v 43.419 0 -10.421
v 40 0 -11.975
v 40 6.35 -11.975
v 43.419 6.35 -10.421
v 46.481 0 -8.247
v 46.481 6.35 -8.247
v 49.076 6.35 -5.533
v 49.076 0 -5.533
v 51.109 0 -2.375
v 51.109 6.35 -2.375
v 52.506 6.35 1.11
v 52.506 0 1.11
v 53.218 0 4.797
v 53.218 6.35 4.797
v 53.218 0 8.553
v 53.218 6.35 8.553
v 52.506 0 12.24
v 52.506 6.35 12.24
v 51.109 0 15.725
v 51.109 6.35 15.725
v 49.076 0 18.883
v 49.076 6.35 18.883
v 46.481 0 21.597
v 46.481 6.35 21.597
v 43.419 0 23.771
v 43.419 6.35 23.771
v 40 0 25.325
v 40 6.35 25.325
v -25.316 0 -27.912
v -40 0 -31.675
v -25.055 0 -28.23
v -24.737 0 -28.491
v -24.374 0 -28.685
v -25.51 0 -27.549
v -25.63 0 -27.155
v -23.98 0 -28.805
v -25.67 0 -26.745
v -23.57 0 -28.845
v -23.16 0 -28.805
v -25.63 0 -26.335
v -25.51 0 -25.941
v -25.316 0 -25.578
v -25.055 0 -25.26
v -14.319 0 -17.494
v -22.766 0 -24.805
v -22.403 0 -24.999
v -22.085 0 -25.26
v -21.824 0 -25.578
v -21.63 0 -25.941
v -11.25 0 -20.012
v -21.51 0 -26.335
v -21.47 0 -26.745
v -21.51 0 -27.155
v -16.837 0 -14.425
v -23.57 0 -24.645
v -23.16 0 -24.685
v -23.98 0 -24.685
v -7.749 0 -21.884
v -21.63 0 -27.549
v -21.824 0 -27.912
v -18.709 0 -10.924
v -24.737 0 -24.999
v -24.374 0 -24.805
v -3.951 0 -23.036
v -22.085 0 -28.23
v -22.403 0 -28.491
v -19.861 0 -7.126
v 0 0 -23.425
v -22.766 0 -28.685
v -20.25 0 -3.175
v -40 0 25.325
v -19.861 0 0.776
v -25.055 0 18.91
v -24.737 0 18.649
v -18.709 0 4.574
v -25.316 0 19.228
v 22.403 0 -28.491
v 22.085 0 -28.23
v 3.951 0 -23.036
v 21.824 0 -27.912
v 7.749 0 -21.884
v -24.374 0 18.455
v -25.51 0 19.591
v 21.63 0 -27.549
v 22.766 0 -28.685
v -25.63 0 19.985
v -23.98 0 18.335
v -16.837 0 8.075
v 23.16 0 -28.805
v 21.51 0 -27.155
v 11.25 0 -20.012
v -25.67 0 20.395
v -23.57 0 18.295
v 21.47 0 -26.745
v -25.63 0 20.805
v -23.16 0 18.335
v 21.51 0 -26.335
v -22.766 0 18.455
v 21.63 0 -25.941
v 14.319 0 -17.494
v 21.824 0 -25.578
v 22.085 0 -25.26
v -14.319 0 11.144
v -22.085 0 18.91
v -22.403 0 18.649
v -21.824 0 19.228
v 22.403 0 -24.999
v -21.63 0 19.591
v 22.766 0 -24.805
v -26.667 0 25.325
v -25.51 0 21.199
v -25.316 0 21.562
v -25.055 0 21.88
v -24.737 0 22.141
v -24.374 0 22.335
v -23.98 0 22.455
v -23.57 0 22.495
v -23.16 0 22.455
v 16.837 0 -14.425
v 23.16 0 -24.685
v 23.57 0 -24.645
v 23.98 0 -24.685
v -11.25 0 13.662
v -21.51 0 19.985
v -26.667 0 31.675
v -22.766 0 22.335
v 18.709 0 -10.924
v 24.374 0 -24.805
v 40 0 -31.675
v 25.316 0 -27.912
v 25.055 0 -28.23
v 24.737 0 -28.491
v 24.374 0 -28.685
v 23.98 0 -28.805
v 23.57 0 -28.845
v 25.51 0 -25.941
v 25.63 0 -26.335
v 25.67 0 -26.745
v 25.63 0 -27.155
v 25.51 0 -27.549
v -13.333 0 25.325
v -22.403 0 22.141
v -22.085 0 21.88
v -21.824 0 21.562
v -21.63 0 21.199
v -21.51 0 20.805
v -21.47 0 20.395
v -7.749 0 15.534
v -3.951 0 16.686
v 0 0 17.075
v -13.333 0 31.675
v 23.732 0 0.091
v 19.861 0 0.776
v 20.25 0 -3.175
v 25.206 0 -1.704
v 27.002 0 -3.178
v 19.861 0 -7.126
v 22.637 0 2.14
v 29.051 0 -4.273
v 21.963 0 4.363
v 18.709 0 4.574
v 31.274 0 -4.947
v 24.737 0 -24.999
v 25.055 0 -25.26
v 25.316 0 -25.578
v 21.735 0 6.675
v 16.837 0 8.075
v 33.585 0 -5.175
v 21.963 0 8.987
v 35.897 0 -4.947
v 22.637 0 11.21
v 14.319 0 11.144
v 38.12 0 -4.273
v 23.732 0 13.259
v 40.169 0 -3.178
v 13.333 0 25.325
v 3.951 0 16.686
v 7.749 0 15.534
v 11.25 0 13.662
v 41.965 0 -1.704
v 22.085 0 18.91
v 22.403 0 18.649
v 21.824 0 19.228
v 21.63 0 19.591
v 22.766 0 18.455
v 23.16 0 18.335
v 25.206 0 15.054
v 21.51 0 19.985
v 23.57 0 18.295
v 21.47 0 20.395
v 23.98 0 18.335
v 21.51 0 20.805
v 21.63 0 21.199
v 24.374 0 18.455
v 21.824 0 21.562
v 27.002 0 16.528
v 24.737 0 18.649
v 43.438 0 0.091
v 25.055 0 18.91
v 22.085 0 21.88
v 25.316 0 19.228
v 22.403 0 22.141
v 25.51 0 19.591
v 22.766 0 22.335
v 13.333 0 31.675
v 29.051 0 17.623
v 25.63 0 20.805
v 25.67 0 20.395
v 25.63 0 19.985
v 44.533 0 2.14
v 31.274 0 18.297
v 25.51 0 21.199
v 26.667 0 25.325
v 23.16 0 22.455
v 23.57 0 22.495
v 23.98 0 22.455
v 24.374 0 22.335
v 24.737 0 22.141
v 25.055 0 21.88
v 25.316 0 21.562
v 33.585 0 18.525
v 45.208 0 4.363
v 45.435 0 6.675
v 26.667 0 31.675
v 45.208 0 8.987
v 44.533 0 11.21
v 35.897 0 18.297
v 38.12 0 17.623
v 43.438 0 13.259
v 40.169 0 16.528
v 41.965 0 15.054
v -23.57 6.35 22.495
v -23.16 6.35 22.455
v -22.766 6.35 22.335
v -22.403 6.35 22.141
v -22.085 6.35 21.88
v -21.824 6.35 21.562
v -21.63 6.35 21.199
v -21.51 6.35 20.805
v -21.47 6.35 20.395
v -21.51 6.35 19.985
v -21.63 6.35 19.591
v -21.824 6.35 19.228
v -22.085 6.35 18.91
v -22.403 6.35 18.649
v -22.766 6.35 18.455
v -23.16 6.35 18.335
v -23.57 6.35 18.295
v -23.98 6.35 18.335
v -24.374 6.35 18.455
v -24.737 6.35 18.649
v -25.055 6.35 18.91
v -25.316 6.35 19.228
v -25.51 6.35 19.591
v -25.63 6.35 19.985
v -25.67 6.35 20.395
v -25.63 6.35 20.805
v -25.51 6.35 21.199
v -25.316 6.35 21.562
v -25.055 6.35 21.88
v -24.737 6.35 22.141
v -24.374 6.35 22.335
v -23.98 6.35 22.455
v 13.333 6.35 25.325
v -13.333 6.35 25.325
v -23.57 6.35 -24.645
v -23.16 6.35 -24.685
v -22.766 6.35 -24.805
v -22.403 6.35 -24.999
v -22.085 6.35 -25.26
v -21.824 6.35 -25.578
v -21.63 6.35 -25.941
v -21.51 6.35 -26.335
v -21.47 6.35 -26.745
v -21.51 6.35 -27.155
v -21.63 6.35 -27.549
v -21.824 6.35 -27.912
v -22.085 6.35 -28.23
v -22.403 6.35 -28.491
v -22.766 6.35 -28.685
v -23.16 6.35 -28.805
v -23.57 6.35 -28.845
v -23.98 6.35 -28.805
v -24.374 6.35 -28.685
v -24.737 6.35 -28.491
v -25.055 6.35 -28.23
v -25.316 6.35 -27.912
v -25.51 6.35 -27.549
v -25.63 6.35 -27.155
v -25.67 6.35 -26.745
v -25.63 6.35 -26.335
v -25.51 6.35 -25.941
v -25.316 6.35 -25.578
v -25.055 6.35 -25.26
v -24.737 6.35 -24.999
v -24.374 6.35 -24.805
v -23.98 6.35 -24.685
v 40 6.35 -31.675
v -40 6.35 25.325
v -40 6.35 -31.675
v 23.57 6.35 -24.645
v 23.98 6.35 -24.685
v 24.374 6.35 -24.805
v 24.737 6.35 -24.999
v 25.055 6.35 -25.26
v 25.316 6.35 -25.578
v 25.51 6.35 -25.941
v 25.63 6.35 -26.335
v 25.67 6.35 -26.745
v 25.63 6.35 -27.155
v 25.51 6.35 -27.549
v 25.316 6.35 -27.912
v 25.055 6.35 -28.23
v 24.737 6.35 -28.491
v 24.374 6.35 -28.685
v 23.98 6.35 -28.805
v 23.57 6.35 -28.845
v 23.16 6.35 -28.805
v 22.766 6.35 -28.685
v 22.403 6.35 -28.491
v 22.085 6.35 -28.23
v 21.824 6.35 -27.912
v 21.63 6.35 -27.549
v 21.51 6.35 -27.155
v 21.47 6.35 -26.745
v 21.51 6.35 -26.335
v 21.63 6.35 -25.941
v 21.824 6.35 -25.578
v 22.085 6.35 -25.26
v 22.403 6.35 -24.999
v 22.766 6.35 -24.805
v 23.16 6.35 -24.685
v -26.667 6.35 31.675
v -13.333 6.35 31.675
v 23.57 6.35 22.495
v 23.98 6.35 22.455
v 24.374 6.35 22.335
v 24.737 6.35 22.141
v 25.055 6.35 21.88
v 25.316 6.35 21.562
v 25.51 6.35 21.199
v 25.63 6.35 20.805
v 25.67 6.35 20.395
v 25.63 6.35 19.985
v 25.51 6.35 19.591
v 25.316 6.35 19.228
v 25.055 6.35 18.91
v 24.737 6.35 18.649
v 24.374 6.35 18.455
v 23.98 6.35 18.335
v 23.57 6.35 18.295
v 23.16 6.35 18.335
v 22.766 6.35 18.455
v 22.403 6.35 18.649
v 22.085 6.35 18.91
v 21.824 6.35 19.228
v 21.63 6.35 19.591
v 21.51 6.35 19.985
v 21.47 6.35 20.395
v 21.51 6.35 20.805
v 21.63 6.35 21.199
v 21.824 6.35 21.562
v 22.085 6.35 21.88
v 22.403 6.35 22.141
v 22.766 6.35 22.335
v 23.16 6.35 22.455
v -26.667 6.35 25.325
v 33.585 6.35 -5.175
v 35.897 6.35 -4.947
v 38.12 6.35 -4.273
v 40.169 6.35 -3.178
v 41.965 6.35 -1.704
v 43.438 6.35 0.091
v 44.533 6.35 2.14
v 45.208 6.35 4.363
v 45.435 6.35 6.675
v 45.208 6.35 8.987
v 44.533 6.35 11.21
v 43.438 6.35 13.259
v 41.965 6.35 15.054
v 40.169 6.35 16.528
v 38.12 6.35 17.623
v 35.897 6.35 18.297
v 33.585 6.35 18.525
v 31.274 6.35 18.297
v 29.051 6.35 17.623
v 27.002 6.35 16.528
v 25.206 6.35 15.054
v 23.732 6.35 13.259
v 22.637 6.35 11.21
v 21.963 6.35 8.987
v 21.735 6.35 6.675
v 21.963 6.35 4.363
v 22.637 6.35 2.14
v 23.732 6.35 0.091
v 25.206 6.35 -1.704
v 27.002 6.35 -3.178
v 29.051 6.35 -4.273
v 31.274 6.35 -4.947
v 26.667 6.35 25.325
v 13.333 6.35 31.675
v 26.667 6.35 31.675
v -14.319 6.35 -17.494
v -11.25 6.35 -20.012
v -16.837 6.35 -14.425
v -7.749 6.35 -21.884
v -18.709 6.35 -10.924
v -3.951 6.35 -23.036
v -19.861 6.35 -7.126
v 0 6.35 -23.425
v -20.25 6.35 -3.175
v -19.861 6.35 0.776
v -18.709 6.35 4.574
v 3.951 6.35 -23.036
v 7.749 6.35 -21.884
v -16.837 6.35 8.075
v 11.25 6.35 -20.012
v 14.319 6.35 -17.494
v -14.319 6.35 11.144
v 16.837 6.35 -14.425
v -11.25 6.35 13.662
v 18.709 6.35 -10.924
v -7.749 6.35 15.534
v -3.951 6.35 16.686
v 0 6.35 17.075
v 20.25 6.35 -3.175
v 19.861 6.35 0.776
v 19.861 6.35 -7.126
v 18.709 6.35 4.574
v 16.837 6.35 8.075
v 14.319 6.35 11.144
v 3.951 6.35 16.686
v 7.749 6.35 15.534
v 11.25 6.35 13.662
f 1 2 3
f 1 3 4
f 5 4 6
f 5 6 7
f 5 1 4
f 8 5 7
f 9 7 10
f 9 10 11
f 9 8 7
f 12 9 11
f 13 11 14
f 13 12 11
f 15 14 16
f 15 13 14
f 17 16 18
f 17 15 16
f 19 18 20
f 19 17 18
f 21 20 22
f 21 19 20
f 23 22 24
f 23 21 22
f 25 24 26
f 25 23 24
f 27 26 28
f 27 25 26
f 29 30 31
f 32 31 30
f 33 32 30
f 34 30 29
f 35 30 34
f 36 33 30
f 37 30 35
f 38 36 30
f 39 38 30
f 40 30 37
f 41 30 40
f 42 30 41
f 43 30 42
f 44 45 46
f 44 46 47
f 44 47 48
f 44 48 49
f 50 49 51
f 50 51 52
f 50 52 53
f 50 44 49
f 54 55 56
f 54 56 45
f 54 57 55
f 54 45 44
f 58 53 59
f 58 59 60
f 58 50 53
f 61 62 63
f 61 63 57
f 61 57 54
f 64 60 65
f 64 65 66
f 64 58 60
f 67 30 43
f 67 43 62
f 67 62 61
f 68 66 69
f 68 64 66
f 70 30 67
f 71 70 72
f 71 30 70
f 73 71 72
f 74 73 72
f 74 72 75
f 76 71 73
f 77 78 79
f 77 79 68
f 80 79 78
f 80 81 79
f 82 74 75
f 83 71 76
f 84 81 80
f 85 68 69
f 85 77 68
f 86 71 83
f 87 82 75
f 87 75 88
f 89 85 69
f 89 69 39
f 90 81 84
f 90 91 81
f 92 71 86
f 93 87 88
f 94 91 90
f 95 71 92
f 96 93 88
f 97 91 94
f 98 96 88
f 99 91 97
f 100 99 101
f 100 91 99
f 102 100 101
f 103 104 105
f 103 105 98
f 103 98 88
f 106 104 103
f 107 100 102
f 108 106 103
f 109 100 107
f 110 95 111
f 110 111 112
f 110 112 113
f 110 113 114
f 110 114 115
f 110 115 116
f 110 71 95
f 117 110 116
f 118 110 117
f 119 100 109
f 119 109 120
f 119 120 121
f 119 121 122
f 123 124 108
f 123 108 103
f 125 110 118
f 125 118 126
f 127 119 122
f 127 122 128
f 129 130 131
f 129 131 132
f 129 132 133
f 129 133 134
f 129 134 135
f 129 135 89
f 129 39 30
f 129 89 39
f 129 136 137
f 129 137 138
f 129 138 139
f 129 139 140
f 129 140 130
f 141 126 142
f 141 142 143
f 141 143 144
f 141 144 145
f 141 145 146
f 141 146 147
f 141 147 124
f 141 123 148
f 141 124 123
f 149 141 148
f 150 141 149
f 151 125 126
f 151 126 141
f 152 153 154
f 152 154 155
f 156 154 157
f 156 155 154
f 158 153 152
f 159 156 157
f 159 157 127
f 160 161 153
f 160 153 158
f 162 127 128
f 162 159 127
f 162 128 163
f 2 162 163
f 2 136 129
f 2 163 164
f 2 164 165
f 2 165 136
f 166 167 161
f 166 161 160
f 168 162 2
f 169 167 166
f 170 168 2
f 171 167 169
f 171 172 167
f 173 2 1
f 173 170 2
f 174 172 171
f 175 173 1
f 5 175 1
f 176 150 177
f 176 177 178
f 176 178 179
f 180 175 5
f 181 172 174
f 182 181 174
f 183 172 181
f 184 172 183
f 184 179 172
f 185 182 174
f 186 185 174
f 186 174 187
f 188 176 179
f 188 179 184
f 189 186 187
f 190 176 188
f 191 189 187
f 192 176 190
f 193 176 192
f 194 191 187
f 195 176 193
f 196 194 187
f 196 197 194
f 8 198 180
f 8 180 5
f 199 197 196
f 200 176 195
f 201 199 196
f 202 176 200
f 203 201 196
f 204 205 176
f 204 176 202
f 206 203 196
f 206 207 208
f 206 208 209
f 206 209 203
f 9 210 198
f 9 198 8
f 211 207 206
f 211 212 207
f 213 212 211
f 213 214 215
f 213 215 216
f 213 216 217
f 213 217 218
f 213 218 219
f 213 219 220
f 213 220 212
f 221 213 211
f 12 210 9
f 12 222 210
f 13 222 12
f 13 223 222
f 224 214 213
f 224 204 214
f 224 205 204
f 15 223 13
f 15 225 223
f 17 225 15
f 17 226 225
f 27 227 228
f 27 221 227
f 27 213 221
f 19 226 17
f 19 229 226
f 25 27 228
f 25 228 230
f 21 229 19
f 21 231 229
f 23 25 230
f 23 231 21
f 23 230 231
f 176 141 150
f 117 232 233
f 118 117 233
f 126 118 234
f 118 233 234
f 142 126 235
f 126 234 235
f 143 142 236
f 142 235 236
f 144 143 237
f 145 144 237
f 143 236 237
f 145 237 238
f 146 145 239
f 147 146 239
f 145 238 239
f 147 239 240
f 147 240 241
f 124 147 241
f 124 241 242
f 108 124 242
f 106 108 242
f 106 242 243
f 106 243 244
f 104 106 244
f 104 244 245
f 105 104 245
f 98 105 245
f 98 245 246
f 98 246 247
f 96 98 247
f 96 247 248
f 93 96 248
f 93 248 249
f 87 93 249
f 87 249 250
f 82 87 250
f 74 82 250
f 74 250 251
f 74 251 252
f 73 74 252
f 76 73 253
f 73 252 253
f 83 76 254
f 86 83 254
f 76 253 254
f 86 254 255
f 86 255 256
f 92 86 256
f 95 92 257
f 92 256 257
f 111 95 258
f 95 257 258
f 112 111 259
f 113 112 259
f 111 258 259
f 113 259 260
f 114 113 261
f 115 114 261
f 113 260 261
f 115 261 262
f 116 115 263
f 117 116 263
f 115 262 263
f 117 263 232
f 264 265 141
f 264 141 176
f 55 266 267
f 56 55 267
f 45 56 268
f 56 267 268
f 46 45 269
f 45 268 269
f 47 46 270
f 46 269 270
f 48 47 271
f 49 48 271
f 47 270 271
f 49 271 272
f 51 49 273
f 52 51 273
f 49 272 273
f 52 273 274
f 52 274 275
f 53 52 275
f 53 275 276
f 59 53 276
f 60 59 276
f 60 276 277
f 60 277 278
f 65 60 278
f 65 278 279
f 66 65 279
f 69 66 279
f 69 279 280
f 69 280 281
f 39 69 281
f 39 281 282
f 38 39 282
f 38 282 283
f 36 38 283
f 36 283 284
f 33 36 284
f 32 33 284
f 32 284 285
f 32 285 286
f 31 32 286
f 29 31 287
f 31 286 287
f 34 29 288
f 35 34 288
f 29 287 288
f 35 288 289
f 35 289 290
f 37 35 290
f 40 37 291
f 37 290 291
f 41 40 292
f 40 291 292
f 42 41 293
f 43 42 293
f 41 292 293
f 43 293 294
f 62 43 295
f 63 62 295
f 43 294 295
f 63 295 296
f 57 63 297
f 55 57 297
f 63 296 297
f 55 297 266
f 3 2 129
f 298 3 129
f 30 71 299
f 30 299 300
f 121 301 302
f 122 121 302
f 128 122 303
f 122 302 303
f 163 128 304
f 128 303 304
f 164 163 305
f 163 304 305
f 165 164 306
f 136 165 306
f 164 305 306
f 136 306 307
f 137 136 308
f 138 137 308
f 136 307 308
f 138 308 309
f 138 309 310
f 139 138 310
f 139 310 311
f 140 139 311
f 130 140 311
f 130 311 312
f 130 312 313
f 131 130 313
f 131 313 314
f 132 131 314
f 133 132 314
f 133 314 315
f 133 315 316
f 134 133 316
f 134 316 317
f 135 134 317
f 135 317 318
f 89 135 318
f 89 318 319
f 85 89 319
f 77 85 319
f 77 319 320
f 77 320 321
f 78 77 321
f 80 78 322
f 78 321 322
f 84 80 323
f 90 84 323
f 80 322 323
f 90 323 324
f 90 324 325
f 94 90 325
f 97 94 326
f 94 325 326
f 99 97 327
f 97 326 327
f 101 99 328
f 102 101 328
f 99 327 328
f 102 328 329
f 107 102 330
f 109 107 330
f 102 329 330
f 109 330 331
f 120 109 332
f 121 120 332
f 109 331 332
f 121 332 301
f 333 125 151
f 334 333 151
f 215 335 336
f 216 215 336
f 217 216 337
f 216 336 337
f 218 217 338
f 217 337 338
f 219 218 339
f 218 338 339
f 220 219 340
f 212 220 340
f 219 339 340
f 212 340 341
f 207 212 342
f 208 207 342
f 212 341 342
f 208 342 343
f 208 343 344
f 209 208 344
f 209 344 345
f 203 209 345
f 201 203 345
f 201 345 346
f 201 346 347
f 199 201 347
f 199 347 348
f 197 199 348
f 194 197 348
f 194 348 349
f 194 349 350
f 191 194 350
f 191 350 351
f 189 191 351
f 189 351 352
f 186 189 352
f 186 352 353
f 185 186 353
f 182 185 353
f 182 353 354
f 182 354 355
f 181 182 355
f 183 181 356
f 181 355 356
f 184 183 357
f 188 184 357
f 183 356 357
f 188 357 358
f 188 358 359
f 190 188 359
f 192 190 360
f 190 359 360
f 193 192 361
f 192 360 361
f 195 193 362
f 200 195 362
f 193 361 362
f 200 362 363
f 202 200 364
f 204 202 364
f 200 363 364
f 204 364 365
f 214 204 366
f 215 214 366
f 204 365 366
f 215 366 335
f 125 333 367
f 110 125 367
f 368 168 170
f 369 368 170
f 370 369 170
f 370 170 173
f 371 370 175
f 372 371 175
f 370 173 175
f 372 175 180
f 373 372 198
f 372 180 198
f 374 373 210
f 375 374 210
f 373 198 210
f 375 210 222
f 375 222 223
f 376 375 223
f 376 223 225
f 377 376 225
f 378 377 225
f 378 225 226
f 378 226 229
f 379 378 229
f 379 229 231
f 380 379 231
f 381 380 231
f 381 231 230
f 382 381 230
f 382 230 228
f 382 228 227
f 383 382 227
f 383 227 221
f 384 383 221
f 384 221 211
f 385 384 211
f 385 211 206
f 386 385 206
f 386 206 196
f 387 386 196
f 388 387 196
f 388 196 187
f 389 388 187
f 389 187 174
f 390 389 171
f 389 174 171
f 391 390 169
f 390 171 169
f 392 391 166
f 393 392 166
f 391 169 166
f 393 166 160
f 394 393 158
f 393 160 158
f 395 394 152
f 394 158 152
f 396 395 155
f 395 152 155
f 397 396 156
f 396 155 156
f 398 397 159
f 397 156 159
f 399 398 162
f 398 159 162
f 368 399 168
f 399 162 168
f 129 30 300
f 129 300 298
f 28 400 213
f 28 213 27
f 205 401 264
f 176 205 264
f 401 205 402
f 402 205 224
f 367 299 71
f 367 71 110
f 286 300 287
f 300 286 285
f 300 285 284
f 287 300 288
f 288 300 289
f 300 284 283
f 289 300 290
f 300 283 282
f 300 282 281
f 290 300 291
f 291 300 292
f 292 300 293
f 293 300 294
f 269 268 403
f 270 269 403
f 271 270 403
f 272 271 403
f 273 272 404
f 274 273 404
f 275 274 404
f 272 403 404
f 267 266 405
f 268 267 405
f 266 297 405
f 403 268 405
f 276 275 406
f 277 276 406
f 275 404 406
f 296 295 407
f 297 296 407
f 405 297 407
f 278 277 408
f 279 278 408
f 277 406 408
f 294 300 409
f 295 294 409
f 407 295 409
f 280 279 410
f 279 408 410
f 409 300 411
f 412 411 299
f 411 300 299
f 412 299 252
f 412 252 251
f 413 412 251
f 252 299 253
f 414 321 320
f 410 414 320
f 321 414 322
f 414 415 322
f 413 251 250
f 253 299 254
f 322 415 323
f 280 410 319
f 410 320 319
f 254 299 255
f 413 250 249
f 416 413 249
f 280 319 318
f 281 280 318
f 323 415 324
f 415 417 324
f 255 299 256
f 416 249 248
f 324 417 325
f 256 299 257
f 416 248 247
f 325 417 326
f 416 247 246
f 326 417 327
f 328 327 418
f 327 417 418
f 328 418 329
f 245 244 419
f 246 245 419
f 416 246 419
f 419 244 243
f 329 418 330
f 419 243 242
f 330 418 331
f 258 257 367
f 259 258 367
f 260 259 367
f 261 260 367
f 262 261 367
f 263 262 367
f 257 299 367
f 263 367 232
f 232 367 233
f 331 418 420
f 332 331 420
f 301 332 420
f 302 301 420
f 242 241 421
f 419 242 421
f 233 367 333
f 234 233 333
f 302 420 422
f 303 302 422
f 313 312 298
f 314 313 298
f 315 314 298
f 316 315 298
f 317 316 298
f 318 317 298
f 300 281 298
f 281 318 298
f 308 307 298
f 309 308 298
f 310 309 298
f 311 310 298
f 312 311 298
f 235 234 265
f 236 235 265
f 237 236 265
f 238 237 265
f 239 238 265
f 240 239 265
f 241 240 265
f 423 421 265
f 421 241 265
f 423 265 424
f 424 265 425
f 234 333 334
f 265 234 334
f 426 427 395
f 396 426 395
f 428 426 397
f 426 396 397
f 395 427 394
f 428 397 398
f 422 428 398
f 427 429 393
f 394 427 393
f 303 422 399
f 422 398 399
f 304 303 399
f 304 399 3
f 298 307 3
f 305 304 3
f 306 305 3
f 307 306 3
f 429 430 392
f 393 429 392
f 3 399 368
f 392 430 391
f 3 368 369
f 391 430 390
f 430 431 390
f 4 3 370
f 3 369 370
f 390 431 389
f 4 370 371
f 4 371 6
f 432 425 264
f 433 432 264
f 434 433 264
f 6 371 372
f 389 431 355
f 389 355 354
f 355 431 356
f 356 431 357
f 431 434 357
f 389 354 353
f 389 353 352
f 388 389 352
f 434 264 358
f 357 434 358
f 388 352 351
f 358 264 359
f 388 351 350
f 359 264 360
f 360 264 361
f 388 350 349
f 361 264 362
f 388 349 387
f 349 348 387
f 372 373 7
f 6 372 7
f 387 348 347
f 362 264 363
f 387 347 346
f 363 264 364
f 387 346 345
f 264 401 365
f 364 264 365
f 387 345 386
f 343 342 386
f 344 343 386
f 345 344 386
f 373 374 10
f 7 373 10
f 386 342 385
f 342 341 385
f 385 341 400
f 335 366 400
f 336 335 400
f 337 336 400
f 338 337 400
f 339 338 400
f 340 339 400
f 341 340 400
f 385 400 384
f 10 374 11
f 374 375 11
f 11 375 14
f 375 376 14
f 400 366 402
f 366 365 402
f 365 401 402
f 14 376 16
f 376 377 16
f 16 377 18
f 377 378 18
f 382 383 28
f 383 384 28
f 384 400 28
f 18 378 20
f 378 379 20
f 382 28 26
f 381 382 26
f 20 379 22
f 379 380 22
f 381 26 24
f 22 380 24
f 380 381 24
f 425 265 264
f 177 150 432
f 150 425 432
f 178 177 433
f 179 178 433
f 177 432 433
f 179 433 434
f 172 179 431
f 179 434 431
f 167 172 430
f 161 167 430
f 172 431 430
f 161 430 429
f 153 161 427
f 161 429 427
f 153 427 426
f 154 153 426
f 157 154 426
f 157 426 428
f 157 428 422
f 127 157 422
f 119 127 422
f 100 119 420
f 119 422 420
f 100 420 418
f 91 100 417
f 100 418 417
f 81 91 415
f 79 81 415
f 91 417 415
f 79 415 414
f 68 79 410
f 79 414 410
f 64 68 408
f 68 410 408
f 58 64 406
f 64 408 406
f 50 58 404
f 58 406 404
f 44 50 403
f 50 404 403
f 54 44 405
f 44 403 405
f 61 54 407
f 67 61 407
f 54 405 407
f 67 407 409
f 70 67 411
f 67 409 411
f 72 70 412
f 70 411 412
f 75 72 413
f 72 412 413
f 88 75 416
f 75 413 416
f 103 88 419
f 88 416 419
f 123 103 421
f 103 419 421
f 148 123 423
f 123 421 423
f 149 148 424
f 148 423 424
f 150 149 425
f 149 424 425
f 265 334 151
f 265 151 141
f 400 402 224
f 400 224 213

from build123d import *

# Parameters (mm, degrees)
SKETCH1_W           = 80
SKETCH1_H           = 63.35
BOSS_EXTRUDE1_DEPTH = 6.35
SKETCH2_W           = 13.333333333
SKETCH2_H           = 6.35
SKETCH2_W_2         = 26.666666666
CUT_EXTRUDE2_DEPTH  = 52.416224336
SKETCH3_R           = 20.25
CUT_EXTRUDE3_DEPTH  = 2.55
SKETCH4_R           = 20.25
CUT_EXTRUDE4_DEPTH  = 52.416224336
SKETCH5_R           = 2.1
CUT_EXTRUDE5_DEPTH  = 52.416224336
BOSS_EXTRUDE2_DEPTH = 6.35
SKETCH13_R          = 11.85
CUT_EXTRUDE8_DEPTH  = 10


with BuildPart() as part:
    # Sketch1 → Boss-Extrude1 (new body)
    with BuildSketch(Plane(origin=(0, 0, 0), x_dir=(1, 0, 0), z_dir=(0, 1, 0))):
        Rectangle(SKETCH1_W, SKETCH1_H)
    extrude(amount=BOSS_EXTRUDE1_DEPTH)

    # Sketch2 → Cut-Extrude2 (cut, through all)
    with BuildSketch(Plane(origin=(0, 6.35, 0), x_dir=(1, 0, 0), z_dir=(0, 1, 0))):
        with Locations((-33.333333334, -28.5)):
            Rectangle(SKETCH2_W, SKETCH2_H)
        with Locations((33.333333334, -28.5)):
            Rectangle(SKETCH2_W, SKETCH2_H)
        with Locations((0, -28.5)):
            Rectangle(SKETCH2_W_2, SKETCH2_H)
    extrude(amount=-CUT_EXTRUDE2_DEPTH, mode=Mode.SUBTRACT)

    # Sketch3 → Cut-Extrude3 (cut)
    with BuildSketch(Plane(origin=(0, 6.35, 0), x_dir=(1, 0, 0), z_dir=(0, 1, 0))):
        with Locations(Location((0, 3.175, 0), (0, 0, 270))):
            Circle(SKETCH3_R)
    extrude(amount=-CUT_EXTRUDE3_DEPTH, mode=Mode.SUBTRACT)

    # Sketch4 → Cut-Extrude4 (cut, through all)
    with BuildSketch(Plane(origin=(0, 6.35, 0), x_dir=(1, 0, 0), z_dir=(0, 1, 0))):
        with Locations(Location((0, 3.175, 0), (0, 0, 270))):
            Circle(SKETCH4_R)
    extrude(amount=-CUT_EXTRUDE4_DEPTH, mode=Mode.SUBTRACT)

    # Sketch5 → Cut-Extrude5 (cut, through all)
    with BuildSketch(Plane(origin=(0, 6.35, 0), x_dir=(1, 0, 0), z_dir=(0, 1, 0))):
        with Locations(Location((23.57, 26.745, 0), (0, 0, 270))):
            Circle(SKETCH5_R)
        with Locations(Location((-23.57, 26.745, 0), (0, 0, 270))):
            Circle(SKETCH5_R)
        with Locations(Location((-23.57, -20.395, 0), (0, 0, 270))):
            Circle(SKETCH5_R)
        with Locations(Location((23.57, -20.395, 0), (0, 0, 270))):
            Circle(SKETCH5_R)
    extrude(amount=-CUT_EXTRUDE5_DEPTH, mode=Mode.SUBTRACT)

    # Sketch12 → Boss-Extrude2 (add)
    with BuildSketch(Plane.XZ):
        with BuildLine():
            Line((40, 25.325), (40, -11.975))
            ThreePointArc((40, -11.975), (53.30769606, 6.675), (40, 25.325))
        make_face()
    extrude(amount=-BOSS_EXTRUDE2_DEPTH)

    # Sketch13 → Cut-Extrude8 (cut)
    with BuildSketch(Plane.XZ):
        with Locations(Location((33.585376282, 6.675, 0), (0, 0, 270))):
            Circle(SKETCH13_R)
    extrude(amount=-CUT_EXTRUDE8_DEPTH, mode=Mode.SUBTRACT)


solid = part.part
